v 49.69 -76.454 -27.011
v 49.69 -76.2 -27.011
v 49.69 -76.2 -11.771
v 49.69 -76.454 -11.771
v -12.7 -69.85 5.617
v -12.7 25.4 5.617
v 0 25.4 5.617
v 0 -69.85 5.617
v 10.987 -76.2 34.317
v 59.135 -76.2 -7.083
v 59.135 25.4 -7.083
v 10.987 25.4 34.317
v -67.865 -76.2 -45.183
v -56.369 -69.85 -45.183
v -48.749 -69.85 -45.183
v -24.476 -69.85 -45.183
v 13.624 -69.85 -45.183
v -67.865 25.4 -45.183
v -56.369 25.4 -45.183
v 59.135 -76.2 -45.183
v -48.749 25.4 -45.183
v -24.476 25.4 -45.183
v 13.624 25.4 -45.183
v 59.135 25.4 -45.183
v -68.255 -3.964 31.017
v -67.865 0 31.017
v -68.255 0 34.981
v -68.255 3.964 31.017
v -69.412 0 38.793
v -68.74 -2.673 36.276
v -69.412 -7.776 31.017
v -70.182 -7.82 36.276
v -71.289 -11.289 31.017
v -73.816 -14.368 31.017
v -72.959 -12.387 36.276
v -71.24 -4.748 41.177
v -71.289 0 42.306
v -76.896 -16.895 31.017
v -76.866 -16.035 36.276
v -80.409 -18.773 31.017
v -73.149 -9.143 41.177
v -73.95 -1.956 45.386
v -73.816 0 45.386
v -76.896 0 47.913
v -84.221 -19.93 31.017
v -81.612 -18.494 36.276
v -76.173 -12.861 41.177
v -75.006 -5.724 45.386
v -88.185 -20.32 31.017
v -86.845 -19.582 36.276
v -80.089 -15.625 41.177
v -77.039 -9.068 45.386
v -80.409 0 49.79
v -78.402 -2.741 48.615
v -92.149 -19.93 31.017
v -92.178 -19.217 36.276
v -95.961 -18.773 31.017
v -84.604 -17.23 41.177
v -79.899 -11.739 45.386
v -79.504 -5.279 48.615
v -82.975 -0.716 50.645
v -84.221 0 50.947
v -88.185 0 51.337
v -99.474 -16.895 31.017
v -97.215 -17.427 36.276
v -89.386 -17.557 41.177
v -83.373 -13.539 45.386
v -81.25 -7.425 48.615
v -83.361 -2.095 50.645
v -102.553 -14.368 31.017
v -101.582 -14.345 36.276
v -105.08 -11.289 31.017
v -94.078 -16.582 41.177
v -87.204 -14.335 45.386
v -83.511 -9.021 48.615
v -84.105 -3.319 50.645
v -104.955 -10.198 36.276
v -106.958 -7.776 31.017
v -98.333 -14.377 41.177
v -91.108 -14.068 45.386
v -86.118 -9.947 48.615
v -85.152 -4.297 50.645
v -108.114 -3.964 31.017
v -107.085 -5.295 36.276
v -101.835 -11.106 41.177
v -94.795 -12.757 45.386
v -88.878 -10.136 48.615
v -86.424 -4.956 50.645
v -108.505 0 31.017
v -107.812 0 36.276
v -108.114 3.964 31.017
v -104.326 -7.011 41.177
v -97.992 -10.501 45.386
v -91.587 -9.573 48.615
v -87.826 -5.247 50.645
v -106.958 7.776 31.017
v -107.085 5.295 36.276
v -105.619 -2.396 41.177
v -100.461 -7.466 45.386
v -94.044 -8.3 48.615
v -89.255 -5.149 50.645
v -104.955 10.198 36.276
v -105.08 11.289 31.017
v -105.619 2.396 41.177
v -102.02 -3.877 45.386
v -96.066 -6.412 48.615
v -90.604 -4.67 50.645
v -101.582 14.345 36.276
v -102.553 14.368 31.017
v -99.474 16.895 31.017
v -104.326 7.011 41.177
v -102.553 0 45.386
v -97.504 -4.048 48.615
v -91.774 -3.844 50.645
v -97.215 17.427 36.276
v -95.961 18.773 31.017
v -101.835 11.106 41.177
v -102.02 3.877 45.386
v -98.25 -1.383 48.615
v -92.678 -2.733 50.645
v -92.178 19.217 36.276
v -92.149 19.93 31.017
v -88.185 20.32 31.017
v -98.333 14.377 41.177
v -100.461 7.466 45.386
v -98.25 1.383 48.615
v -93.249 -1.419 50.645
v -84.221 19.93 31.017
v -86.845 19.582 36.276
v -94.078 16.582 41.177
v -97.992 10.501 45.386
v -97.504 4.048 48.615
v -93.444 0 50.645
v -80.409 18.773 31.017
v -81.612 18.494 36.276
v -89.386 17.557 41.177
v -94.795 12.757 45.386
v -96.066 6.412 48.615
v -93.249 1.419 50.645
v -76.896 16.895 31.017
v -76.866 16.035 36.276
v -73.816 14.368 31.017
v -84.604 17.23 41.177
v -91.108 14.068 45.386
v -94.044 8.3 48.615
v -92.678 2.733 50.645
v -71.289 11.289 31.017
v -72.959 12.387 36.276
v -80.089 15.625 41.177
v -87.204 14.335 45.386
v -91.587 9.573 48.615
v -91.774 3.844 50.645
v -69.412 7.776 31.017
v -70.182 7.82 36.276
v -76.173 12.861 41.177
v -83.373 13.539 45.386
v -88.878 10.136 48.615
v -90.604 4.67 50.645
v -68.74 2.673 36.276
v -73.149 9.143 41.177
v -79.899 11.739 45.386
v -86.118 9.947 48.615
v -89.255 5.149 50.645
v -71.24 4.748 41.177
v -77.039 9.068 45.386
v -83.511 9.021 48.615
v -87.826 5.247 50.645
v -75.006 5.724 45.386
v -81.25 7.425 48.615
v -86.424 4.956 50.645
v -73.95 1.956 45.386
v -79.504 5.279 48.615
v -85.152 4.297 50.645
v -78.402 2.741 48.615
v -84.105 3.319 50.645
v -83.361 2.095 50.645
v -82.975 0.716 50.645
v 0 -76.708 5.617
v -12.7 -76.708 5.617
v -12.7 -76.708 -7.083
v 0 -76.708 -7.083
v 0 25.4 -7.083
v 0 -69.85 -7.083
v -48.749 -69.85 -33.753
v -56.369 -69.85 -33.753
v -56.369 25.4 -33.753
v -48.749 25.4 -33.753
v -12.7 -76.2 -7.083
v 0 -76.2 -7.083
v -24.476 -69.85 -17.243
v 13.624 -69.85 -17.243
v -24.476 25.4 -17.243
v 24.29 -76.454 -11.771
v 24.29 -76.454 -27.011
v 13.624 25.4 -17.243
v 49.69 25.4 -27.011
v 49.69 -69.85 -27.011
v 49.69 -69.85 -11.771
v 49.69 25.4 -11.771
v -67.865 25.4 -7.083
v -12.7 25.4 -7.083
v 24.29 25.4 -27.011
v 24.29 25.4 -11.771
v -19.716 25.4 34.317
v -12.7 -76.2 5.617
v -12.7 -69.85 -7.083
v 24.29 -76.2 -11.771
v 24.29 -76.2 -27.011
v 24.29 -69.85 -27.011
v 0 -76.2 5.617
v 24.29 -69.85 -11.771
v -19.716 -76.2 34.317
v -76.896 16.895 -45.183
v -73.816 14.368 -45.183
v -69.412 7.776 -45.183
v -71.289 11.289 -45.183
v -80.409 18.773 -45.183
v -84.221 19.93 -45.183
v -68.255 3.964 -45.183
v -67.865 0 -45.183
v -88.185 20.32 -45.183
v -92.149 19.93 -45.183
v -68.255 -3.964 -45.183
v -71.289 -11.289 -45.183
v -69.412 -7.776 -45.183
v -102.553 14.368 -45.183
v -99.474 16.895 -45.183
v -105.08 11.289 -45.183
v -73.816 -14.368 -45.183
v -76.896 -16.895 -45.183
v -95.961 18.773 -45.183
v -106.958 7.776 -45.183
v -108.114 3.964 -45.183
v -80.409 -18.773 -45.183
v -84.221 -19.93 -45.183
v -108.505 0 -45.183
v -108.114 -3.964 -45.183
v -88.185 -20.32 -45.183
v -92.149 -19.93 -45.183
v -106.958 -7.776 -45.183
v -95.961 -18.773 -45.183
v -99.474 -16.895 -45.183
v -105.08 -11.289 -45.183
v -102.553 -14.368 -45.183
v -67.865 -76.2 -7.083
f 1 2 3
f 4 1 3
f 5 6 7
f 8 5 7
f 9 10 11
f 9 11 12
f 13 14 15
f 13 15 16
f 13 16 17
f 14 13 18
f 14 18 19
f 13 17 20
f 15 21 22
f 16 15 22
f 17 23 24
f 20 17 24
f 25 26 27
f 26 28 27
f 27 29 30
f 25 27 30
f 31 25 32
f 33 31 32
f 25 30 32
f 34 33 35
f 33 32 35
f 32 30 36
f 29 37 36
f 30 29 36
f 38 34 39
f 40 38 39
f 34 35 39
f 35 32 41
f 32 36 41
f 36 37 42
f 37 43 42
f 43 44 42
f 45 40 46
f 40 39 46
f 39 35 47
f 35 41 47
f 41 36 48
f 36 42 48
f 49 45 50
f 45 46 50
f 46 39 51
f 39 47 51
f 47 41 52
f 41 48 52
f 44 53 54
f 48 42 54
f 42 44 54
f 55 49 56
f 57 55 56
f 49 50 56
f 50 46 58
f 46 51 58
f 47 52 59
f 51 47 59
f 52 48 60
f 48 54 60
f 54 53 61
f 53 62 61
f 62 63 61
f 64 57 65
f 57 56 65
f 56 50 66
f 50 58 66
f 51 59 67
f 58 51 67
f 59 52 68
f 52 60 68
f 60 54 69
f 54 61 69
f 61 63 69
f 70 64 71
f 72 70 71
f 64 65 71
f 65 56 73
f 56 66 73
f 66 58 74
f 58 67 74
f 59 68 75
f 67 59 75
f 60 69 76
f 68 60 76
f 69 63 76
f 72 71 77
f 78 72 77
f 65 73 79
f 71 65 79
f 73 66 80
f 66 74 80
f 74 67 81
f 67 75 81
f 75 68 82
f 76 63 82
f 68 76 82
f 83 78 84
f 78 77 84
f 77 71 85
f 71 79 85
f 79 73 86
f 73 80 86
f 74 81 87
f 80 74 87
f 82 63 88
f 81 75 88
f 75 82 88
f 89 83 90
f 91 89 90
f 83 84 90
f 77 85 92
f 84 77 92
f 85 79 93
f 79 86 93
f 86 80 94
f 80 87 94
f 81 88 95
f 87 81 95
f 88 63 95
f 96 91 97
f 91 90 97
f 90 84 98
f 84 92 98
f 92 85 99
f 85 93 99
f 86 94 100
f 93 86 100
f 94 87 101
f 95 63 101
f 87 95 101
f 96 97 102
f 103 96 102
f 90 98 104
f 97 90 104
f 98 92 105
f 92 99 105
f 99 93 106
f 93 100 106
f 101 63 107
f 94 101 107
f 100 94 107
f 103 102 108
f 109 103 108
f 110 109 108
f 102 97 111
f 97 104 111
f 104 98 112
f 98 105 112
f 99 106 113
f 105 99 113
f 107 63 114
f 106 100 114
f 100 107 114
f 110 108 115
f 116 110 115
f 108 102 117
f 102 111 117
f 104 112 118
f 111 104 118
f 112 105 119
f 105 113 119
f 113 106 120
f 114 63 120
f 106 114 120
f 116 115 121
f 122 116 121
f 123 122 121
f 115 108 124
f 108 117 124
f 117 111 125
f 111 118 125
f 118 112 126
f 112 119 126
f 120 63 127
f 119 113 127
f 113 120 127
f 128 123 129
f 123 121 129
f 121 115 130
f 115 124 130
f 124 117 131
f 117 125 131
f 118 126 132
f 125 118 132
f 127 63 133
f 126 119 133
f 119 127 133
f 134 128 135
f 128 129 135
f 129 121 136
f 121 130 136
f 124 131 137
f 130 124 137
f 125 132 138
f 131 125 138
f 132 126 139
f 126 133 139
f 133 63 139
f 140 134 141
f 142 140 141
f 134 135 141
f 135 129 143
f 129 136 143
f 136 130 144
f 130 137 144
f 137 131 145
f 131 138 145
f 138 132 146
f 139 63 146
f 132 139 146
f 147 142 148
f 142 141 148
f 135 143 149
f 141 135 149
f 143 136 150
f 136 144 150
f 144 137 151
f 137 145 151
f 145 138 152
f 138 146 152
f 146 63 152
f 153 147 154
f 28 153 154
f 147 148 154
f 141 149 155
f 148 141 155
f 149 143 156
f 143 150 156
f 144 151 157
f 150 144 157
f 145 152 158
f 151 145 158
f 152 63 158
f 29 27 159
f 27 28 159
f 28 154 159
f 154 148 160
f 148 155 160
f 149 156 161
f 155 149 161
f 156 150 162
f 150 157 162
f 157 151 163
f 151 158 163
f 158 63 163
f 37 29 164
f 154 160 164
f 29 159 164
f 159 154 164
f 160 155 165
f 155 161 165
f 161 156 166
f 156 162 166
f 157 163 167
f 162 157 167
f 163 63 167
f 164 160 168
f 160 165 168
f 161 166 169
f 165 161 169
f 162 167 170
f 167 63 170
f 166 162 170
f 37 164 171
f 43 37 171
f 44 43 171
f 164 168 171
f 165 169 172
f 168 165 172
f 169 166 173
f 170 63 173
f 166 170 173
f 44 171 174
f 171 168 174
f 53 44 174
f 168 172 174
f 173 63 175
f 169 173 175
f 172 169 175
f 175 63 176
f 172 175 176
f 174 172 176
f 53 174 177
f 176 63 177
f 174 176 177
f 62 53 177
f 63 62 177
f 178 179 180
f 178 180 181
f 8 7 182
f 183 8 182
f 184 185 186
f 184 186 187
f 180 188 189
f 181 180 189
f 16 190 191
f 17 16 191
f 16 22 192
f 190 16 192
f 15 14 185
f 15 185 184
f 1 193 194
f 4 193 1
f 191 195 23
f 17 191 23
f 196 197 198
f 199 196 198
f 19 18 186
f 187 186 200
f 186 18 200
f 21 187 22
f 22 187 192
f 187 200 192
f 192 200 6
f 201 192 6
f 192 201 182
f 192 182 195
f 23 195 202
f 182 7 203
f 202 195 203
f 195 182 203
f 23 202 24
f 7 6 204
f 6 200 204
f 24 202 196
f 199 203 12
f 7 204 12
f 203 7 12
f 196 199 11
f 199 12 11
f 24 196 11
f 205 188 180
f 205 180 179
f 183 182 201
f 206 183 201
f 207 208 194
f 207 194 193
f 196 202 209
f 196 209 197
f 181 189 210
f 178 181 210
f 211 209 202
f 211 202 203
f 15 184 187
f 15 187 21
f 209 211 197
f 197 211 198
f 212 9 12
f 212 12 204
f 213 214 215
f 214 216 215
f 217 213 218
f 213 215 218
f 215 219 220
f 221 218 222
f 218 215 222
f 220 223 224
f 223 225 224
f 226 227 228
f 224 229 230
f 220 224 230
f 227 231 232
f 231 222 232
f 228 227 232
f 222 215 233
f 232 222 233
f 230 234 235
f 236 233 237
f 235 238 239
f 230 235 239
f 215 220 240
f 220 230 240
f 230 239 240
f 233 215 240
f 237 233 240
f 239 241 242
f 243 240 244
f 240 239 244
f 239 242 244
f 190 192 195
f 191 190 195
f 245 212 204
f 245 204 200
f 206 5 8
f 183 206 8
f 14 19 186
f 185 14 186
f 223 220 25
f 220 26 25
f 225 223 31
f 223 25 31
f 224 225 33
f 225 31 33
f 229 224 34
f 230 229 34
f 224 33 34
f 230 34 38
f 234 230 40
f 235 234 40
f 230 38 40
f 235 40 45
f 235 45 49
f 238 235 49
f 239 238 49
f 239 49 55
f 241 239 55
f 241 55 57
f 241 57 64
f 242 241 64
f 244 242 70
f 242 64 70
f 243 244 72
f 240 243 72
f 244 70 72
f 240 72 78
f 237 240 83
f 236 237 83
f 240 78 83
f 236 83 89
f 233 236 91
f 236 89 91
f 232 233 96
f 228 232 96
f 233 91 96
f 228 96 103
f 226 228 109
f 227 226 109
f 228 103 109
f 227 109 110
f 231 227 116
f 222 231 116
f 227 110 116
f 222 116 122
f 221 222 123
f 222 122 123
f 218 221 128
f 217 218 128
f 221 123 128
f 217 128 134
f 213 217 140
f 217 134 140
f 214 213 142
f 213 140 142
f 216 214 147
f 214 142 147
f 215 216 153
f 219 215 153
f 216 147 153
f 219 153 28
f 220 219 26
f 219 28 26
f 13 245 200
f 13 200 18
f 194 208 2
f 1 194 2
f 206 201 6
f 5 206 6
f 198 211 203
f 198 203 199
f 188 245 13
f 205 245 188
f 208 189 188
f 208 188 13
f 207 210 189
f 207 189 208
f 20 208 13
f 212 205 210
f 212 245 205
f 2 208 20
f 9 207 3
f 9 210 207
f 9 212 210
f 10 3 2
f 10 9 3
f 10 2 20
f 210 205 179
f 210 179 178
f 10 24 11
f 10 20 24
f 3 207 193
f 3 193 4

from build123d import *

# Parameters (mm, degrees)
F0_W          = 25.4
F0_H          = 15.24
F1_DEPTH      = 76.2
F1_DEPTH_BACK = 25.4
F3_START      = 69.85
F0_W_2        = 38.1
F0_H_2        = 27.94
F3_DEPTH      = 6.35
F4_START      = 69.85
F0_W_3        = 7.62
F0_H_3        = 11.43
F4_DEPTH      = 6.35
F5_START      = 69.85
F0_W_4        = 12.7
F0_H_4        = 12.7
F5_DEPTH      = 6.858
F6_START      = 69.85
F6_DEPTH      = 6.604


with BuildPart() as f1:
    # F0 (on Front) → F1 (new body, two sides)
    with BuildSketch(Plane.XZ) as f1_sk:
        Polygon((59.1352019906, -45.1827376871), (59.1352019906, -7.0827376871), (0, -7.0827376871), (-12.7, -7.0827376871), (-67.8647980094, -7.0827376871), (-67.8647980094, -45.1827376871), (-56.3685745001, -45.1827376871), (-56.3685745001, -33.7527376871), (-48.7485745001, -33.7527376871), (-48.7485745001, -45.1827376871), (-24.4758278131, -45.1827376871), (-24.4758278131, -17.2427376871), (13.6241721869, -17.2427376871), (13.6241721869, -45.1827376871), align=None)
        with Locations((36.9904070765, -19.3914072331)):
            Rectangle(F0_W, F0_H, mode=Mode.SUBTRACT)
        Polygon((0, -7.0827376871), (59.1352019906, -7.0827376871), (10.986558335, 34.3172395366), (-19.7161543538, 34.3172395366), (-67.8647980094, -7.0827376871), (-12.7, -7.0827376871), (-12.7, 5.6172623129), (0, 5.6172623129), align=None)
    extrude(amount=F1_DEPTH)
    extrude(f1_sk.sketch, amount=-F1_DEPTH_BACK)

    # F0 (on Front) → F3 (join)
    with BuildSketch(Plane.XZ.offset(F3_START)):
        with Locations((-5.4258278131, -31.2127376871)):
            Rectangle(F0_W_2, F0_H_2)
    extrude(amount=F3_DEPTH)

    # F0 (on Front) → F4 (join)
    with BuildSketch(Plane.XZ.offset(F4_START)):
        with Locations((-52.5585745001, -39.4677376871)):
            Rectangle(F0_W_3, F0_H_3)
    extrude(amount=F4_DEPTH)

    # F0 (on Front) → F5 (join)
    with BuildSketch(Plane.XZ.offset(F5_START)):
        with Locations((-6.35, -0.7327376871)):
            Rectangle(F0_W_4, F0_H_4)
    extrude(amount=F5_DEPTH)

    # F0 (on Front) → F6 (join)
    with BuildSketch(Plane.XZ.offset(F6_START)):
        with Locations((36.9904070765, -19.3914072331)):
            Rectangle(F0_W, F0_H)
    extrude(amount=F6_DEPTH)


with BuildPart() as f2:
    # F0 (on Front) → F2 (revolve)
    with BuildSketch(Plane.XZ):
        with BuildLine():
            Line((-88.1847980094, 31.0172623129), (-67.8647980094, 31.0172623129))
            ThreePointArc((-67.8647980094, 31.0172623129), (-73.8163882157, 45.3856721066), (-88.1847980094, 51.3372623129))
            Line((-88.1847980094, 51.3372623129), (-88.1847980094, 31.0172623129))
        make_face()
        Polygon((-67.8647980094, -45.1827376871), (-67.8647980094, -7.0827376871), (-67.8647980094, 31.0172623129), (-88.1847980094, 31.0172623129), (-88.1847980094, -45.1827376871), align=None)
    revolve(axis=Axis((-88.1847980094, 0, 3.0772623129), (0, 0, -1)))


solid = Compound([f1.part, f2.part])
